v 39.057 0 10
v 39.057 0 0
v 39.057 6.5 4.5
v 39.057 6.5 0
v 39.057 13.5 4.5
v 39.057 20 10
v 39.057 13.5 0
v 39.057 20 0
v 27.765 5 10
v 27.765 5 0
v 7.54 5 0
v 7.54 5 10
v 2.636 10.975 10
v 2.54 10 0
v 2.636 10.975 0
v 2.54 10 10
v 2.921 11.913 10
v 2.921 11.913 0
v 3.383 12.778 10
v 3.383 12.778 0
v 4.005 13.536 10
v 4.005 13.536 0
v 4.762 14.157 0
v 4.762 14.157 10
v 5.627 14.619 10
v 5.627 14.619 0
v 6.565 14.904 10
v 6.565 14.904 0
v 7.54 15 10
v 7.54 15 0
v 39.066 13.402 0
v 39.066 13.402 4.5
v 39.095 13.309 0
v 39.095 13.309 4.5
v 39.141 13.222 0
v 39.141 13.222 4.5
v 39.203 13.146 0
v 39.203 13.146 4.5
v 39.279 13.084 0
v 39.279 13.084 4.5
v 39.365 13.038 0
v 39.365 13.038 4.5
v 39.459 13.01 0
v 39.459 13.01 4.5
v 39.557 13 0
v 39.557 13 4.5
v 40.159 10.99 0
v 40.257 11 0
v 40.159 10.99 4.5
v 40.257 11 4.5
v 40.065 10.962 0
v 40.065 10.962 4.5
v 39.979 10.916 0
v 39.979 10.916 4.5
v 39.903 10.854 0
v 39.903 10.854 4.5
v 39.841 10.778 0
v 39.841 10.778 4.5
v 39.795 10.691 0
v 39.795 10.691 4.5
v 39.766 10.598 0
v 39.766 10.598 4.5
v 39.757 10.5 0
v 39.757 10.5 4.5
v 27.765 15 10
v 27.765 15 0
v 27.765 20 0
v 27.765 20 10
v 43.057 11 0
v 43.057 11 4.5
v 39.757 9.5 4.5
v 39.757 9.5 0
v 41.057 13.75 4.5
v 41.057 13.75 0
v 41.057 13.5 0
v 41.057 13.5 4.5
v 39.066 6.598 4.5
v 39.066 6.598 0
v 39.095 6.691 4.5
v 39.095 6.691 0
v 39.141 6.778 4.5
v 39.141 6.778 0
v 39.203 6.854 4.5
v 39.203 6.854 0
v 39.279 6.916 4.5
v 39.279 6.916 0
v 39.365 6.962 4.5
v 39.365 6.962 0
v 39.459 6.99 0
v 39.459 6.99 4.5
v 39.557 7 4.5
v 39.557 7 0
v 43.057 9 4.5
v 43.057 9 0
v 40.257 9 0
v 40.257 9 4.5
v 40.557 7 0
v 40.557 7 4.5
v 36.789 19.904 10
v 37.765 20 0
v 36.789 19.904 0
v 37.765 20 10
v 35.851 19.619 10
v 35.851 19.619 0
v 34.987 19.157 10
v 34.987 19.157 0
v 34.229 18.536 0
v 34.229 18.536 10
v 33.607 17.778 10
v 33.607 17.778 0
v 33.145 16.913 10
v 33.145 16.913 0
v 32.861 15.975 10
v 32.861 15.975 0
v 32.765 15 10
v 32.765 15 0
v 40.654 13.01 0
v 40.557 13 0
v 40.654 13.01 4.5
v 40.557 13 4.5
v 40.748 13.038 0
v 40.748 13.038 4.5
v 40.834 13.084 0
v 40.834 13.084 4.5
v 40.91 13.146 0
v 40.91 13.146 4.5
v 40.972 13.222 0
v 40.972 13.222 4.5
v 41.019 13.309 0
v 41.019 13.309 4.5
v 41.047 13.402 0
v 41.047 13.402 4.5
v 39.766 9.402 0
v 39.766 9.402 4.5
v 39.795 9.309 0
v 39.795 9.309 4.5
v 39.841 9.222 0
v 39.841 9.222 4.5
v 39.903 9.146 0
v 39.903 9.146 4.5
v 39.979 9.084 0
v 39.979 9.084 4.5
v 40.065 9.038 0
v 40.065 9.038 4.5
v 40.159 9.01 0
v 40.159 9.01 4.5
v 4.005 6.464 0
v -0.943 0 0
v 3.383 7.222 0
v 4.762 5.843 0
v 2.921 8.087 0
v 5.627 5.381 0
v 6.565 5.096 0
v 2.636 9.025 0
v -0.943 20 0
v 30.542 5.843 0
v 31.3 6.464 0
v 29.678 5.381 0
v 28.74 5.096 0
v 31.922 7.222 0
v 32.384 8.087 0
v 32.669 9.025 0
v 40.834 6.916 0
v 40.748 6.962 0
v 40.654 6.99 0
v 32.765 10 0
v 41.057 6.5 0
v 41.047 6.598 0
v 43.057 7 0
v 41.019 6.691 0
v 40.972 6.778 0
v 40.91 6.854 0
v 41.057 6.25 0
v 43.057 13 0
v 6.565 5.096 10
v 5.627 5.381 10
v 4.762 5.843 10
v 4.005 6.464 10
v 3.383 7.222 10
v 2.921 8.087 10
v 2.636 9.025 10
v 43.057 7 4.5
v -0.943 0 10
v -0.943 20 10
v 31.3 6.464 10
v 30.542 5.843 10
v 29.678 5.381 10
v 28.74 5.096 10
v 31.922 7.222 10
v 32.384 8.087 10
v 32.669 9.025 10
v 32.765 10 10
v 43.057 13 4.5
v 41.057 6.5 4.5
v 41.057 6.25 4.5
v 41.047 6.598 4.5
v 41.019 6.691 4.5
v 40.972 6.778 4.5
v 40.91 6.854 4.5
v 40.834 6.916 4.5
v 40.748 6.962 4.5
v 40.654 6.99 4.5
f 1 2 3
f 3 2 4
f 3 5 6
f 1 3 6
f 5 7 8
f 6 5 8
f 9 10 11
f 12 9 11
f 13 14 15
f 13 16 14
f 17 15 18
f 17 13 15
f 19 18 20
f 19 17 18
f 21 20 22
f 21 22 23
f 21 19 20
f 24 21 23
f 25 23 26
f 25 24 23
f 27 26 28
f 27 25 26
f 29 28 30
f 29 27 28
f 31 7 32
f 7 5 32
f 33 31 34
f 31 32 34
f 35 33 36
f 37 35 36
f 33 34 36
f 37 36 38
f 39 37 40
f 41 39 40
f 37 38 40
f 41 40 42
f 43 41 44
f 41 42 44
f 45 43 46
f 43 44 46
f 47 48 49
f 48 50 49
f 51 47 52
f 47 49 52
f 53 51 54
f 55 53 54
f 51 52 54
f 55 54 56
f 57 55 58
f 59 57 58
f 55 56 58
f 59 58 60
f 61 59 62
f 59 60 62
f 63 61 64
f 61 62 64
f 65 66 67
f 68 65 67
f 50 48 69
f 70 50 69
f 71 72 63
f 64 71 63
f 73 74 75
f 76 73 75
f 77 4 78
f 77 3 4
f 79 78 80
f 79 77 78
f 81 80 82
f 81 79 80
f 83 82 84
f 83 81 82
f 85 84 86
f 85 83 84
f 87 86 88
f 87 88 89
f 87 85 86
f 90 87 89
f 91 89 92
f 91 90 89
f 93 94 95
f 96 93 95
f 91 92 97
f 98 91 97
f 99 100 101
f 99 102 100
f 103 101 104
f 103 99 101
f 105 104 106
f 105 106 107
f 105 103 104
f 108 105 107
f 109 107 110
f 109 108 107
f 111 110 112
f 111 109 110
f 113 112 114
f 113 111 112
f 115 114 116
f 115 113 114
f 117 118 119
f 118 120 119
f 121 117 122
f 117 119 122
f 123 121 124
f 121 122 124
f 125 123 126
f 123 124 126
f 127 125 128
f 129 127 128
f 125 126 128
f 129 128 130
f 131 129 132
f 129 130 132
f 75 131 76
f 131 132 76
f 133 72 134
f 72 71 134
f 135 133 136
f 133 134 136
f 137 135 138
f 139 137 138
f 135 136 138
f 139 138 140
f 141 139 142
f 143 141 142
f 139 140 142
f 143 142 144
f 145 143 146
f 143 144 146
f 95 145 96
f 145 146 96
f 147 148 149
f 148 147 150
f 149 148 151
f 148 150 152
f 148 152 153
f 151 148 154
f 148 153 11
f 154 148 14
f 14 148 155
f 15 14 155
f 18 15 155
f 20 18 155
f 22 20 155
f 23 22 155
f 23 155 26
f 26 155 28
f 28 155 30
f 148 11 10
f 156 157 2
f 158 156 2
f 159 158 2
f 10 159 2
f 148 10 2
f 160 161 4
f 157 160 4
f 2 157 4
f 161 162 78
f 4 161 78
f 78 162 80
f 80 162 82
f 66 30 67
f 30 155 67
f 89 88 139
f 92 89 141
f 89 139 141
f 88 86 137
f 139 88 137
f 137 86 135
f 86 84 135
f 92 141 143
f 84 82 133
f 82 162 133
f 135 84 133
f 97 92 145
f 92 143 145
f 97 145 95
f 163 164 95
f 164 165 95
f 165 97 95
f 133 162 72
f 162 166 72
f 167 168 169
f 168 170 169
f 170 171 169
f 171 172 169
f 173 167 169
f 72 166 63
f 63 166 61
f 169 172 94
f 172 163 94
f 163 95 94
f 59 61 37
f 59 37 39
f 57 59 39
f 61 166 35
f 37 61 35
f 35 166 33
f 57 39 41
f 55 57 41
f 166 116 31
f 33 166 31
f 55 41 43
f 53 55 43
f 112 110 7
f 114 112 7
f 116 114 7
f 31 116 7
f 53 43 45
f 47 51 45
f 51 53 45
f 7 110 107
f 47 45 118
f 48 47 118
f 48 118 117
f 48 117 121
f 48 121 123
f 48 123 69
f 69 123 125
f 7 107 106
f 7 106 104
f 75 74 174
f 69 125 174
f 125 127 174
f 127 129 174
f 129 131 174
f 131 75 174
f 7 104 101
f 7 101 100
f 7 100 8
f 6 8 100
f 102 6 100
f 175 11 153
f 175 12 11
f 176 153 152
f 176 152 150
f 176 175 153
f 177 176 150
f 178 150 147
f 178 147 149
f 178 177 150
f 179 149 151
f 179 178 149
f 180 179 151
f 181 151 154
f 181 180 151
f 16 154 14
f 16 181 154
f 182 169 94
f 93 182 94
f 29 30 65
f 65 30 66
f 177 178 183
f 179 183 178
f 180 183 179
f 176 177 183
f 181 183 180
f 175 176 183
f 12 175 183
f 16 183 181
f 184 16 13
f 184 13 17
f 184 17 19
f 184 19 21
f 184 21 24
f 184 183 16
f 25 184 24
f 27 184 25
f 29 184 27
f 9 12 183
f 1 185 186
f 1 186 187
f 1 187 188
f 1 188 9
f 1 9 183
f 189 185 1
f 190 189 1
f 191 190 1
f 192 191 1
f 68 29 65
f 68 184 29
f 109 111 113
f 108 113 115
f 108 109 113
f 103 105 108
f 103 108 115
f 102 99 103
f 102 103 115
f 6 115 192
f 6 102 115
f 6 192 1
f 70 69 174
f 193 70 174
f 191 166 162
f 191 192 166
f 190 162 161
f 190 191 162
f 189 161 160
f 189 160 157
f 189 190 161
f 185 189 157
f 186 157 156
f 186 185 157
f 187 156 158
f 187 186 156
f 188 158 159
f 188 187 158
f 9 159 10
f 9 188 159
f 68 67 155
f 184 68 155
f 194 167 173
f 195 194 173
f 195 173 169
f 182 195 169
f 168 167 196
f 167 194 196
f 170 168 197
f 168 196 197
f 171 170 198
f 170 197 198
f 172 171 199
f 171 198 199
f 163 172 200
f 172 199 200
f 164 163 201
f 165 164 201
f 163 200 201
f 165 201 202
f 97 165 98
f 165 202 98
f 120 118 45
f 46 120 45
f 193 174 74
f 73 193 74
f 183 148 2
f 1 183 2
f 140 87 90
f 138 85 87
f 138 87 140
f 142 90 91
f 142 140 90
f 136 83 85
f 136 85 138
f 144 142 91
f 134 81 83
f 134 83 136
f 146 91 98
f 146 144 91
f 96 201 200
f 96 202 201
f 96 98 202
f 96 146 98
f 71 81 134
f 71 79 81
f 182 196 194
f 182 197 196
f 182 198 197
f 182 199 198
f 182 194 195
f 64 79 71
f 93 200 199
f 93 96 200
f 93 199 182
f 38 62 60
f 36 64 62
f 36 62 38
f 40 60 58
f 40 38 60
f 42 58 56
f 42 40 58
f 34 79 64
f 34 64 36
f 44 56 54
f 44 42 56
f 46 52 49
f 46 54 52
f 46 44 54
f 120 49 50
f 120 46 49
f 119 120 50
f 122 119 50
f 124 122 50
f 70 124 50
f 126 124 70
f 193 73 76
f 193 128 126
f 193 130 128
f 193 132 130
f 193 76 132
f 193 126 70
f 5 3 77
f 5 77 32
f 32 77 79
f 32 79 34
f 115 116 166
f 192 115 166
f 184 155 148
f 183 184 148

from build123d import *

# Parameters (mm, degrees)
F0_W     = 22.0889396991
F0_H     = 5
F1_DEPTH = 10
F0_W_2   = 2
F0_H_2   = 2
F0_W_3   = 0.7
F2_DEPTH = 4.5
F3_R     = 4.99999
F4_R     = 0.5


# Not quite as in the source:
# - a fillet or chamfer is up to 0.001 mm smaller than in the source, because OpenCascade refuses the exact size


with BuildPart() as f1:
    # F0 (on Top) → F1 (new body)
    with BuildSketch(Plane.XY):
        Polygon((-0.9434188306, 20), (-0.9434188306, 0), (5.6756753474, 0), (5.6756753474, 5), (2.5402316824, 5), (2.5402316824, 15), (5.6756753474, 15), (5.6756753474, 20), align=None)
        Polygon((5.6756753474, 5), (5.6756753474, 0), (39.0565811694, 0), (39.0565811694, 7), (39.0565811694, 9), (39.0565811694, 11), (39.0565811694, 13), (39.0565811694, 20), (32.7646150465, 20), (32.7646150465, 15), (32.7646150465, 5), align=None)
        with Locations((16.720145197, 17.5)):
            Rectangle(F0_W, F0_H)
    extrude(amount=F1_DEPTH)

    # F0 (on Top) → F2 (join)
    with BuildSketch(Plane.XY):
        Polygon((39.0565811694, 9), (39.0565811694, 7), (41.0565811694, 7), (41.0565811694, 9), (39.7565811694, 9), align=None)
        with Locations((42.0565811694, 8)):
            Rectangle(F0_W_2, F0_H_2)
        Polygon((43.0565811694, 7), (41.0565811694, 7), (41.0565811694, 6.25), align=None)
        Polygon((39.0565811694, 13), (39.0565811694, 11), (39.7565811694, 11), (41.0565811694, 11), (41.0565811694, 13), align=None)
        with Locations((42.0565811694, 12)):
            Rectangle(F0_W_2, F0_H_2)
        Polygon((41.0565811694, 13.75), (41.0565811694, 13), (43.0565811694, 13), align=None)
        with Locations((39.4065811694, 10)):
            Rectangle(F0_W_3, F0_H_2)
    extrude(amount=F2_DEPTH)

    # F3 (radius 5 in the source; OpenCascade refuses exactly that, so slightly less here)
    f3_edges = [f1.edges().sort_by_distance(p)[0] for p in [
        (2.540232, 15, 5),
        (2.540232, 5, 5),
        (32.764615, 5, 5),
        (32.764615, 20, 5),
    ]]
    fillet(f3_edges, radius=F3_R)

    # F4
    f4_edges = [f1.edges().sort_by_distance(p)[0] for p in [
        (39.056581, 13, 2.25),
        (39.056581, 7, 2.25),
        (41.056581, 7, 2.25),
        (41.056581, 13, 2.25),
        (39.756581, 11, 2.25),
        (39.756581, 9, 2.25),
    ]]
    fillet(f4_edges, radius=F4_R)


solid = f1.part
